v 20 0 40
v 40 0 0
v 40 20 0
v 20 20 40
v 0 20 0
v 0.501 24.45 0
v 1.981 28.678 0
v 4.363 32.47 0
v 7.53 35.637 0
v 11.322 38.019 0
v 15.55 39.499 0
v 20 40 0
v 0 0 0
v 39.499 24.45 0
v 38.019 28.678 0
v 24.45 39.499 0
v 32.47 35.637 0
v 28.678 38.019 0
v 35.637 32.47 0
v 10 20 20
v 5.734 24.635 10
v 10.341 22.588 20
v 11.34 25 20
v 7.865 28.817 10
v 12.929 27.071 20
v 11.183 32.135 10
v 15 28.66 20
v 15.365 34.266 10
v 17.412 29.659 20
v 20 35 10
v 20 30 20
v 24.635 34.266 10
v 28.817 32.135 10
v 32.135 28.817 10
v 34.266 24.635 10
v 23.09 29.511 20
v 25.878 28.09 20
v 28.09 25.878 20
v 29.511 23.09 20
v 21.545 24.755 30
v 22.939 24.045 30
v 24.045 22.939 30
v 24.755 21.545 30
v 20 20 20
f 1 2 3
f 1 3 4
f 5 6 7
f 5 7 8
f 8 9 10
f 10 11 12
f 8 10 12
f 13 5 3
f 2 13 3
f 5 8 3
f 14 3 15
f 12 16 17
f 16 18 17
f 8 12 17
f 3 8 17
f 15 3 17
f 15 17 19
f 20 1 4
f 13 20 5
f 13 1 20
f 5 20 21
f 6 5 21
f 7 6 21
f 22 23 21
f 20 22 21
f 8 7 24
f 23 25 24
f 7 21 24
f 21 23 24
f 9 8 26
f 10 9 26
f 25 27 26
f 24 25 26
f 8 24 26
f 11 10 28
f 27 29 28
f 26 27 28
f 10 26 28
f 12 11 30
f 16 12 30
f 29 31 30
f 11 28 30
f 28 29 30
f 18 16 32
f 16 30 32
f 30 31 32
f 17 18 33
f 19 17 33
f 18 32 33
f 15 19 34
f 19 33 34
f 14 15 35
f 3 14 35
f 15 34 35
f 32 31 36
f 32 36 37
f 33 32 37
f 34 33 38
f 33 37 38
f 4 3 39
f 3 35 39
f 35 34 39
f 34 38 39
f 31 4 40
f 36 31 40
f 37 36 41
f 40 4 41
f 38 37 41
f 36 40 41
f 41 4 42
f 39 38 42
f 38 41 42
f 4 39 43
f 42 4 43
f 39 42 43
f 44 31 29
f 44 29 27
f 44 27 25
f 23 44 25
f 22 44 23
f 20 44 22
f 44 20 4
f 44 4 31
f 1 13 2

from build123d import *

# Parameters (mm, degrees)
SKETCH1_W           = 40
SKETCH1_H           = 20
BOSS_EXTRUDE1_DEPTH = 40
CUT_EXTRUDE18_DEPTH = 20
CUT_EXTRUDE20_DEPTH = 59
CUT_EXTRUDE21_DEPTH = 59
SKETCH13_W          = 56.232322264
SKETCH13_H          = 131.72647096
CUT_EXTRUDE22_DEPTH = 20
REVOLVE1_ANGLE      = 180
CUT_EXTRUDE23_DEPTH = 20


with BuildPart() as part:
    # Sketch1 → Boss-Extrude1 (new body)
    with BuildSketch(Plane.XY):
        with BuildLine():
            Line((0, 20), (40, 20))
            ThreePointArc((40, 20), (20, 40), (0, 20))
        make_face()
        with Locations((20, 10)):
            Rectangle(SKETCH1_W, SKETCH1_H)
    extrude(amount=BOSS_EXTRUDE1_DEPTH)

    # Sketch4 → Cut-Extrude18 (cut)
    with BuildSketch(Plane.XY.offset(40)):
        with BuildLine():
            Line((20, 30), (20, 20))
            Line((20, 20), (10, 20))
            ThreePointArc((10, 20), (12.928932188, 27.071067812), (20, 30))
        make_face()
    extrude(amount=-CUT_EXTRUDE18_DEPTH, mode=Mode.SUBTRACT)

    # Sketch11 → Cut-Extrude20 (cut)
    with BuildSketch(Plane(origin=(0, 0, 0), x_dir=(1, 0, 0), z_dir=(0, 1, 0))):
        Polygon((20, -40), (0, 0), (0, -40), align=None)
        Polygon((40, 0), (20, -40), (40, -40), align=None)
    extrude(amount=CUT_EXTRUDE20_DEPTH, mode=Mode.SUBTRACT)

    # Sketch12 → Cut-Extrude21 (cut)
    with BuildSketch(Plane(origin=(0, 0, 0), x_dir=(0, 0, -1), z_dir=(1, 0, 0))):
        Polygon((-40, 20), (0, 40), (-40, 40), align=None)
    extrude(amount=CUT_EXTRUDE21_DEPTH, mode=Mode.SUBTRACT)

    # Sketch13 → Cut-Extrude22 (cut)
    with BuildSketch(Plane(origin=(0, 20, 0), x_dir=(1, 0, 0), z_dir=(0, 1, 0))):
        with Locations((25.992745576, -5.369768382)):
            Rectangle(SKETCH13_W, SKETCH13_H)
    extrude(amount=CUT_EXTRUDE22_DEPTH, mode=Mode.SUBTRACT)

    # Sketch14 → Revolve1 (revolve)
    with BuildSketch(Plane(origin=(0, 20, 0), x_dir=(1, 0, 0), z_dir=(0, 1, 0))):
        Polygon((20, -40), (20, 0), (0, 0), align=None)
    revolve(axis=Axis((20, 20, 40), (0, 0, -1)), revolution_arc=REVOLVE1_ANGLE)

    # Sketch15 → Cut-Extrude23 (cut)
    with BuildSketch(Plane(origin=(0, 20, 0), x_dir=(1, 0, 0), z_dir=(0, 1, 0))):
        Polygon((20, -40), (20, -20), (10, -20), align=None)
    extrude(amount=CUT_EXTRUDE23_DEPTH, mode=Mode.SUBTRACT)


solid = part.part
